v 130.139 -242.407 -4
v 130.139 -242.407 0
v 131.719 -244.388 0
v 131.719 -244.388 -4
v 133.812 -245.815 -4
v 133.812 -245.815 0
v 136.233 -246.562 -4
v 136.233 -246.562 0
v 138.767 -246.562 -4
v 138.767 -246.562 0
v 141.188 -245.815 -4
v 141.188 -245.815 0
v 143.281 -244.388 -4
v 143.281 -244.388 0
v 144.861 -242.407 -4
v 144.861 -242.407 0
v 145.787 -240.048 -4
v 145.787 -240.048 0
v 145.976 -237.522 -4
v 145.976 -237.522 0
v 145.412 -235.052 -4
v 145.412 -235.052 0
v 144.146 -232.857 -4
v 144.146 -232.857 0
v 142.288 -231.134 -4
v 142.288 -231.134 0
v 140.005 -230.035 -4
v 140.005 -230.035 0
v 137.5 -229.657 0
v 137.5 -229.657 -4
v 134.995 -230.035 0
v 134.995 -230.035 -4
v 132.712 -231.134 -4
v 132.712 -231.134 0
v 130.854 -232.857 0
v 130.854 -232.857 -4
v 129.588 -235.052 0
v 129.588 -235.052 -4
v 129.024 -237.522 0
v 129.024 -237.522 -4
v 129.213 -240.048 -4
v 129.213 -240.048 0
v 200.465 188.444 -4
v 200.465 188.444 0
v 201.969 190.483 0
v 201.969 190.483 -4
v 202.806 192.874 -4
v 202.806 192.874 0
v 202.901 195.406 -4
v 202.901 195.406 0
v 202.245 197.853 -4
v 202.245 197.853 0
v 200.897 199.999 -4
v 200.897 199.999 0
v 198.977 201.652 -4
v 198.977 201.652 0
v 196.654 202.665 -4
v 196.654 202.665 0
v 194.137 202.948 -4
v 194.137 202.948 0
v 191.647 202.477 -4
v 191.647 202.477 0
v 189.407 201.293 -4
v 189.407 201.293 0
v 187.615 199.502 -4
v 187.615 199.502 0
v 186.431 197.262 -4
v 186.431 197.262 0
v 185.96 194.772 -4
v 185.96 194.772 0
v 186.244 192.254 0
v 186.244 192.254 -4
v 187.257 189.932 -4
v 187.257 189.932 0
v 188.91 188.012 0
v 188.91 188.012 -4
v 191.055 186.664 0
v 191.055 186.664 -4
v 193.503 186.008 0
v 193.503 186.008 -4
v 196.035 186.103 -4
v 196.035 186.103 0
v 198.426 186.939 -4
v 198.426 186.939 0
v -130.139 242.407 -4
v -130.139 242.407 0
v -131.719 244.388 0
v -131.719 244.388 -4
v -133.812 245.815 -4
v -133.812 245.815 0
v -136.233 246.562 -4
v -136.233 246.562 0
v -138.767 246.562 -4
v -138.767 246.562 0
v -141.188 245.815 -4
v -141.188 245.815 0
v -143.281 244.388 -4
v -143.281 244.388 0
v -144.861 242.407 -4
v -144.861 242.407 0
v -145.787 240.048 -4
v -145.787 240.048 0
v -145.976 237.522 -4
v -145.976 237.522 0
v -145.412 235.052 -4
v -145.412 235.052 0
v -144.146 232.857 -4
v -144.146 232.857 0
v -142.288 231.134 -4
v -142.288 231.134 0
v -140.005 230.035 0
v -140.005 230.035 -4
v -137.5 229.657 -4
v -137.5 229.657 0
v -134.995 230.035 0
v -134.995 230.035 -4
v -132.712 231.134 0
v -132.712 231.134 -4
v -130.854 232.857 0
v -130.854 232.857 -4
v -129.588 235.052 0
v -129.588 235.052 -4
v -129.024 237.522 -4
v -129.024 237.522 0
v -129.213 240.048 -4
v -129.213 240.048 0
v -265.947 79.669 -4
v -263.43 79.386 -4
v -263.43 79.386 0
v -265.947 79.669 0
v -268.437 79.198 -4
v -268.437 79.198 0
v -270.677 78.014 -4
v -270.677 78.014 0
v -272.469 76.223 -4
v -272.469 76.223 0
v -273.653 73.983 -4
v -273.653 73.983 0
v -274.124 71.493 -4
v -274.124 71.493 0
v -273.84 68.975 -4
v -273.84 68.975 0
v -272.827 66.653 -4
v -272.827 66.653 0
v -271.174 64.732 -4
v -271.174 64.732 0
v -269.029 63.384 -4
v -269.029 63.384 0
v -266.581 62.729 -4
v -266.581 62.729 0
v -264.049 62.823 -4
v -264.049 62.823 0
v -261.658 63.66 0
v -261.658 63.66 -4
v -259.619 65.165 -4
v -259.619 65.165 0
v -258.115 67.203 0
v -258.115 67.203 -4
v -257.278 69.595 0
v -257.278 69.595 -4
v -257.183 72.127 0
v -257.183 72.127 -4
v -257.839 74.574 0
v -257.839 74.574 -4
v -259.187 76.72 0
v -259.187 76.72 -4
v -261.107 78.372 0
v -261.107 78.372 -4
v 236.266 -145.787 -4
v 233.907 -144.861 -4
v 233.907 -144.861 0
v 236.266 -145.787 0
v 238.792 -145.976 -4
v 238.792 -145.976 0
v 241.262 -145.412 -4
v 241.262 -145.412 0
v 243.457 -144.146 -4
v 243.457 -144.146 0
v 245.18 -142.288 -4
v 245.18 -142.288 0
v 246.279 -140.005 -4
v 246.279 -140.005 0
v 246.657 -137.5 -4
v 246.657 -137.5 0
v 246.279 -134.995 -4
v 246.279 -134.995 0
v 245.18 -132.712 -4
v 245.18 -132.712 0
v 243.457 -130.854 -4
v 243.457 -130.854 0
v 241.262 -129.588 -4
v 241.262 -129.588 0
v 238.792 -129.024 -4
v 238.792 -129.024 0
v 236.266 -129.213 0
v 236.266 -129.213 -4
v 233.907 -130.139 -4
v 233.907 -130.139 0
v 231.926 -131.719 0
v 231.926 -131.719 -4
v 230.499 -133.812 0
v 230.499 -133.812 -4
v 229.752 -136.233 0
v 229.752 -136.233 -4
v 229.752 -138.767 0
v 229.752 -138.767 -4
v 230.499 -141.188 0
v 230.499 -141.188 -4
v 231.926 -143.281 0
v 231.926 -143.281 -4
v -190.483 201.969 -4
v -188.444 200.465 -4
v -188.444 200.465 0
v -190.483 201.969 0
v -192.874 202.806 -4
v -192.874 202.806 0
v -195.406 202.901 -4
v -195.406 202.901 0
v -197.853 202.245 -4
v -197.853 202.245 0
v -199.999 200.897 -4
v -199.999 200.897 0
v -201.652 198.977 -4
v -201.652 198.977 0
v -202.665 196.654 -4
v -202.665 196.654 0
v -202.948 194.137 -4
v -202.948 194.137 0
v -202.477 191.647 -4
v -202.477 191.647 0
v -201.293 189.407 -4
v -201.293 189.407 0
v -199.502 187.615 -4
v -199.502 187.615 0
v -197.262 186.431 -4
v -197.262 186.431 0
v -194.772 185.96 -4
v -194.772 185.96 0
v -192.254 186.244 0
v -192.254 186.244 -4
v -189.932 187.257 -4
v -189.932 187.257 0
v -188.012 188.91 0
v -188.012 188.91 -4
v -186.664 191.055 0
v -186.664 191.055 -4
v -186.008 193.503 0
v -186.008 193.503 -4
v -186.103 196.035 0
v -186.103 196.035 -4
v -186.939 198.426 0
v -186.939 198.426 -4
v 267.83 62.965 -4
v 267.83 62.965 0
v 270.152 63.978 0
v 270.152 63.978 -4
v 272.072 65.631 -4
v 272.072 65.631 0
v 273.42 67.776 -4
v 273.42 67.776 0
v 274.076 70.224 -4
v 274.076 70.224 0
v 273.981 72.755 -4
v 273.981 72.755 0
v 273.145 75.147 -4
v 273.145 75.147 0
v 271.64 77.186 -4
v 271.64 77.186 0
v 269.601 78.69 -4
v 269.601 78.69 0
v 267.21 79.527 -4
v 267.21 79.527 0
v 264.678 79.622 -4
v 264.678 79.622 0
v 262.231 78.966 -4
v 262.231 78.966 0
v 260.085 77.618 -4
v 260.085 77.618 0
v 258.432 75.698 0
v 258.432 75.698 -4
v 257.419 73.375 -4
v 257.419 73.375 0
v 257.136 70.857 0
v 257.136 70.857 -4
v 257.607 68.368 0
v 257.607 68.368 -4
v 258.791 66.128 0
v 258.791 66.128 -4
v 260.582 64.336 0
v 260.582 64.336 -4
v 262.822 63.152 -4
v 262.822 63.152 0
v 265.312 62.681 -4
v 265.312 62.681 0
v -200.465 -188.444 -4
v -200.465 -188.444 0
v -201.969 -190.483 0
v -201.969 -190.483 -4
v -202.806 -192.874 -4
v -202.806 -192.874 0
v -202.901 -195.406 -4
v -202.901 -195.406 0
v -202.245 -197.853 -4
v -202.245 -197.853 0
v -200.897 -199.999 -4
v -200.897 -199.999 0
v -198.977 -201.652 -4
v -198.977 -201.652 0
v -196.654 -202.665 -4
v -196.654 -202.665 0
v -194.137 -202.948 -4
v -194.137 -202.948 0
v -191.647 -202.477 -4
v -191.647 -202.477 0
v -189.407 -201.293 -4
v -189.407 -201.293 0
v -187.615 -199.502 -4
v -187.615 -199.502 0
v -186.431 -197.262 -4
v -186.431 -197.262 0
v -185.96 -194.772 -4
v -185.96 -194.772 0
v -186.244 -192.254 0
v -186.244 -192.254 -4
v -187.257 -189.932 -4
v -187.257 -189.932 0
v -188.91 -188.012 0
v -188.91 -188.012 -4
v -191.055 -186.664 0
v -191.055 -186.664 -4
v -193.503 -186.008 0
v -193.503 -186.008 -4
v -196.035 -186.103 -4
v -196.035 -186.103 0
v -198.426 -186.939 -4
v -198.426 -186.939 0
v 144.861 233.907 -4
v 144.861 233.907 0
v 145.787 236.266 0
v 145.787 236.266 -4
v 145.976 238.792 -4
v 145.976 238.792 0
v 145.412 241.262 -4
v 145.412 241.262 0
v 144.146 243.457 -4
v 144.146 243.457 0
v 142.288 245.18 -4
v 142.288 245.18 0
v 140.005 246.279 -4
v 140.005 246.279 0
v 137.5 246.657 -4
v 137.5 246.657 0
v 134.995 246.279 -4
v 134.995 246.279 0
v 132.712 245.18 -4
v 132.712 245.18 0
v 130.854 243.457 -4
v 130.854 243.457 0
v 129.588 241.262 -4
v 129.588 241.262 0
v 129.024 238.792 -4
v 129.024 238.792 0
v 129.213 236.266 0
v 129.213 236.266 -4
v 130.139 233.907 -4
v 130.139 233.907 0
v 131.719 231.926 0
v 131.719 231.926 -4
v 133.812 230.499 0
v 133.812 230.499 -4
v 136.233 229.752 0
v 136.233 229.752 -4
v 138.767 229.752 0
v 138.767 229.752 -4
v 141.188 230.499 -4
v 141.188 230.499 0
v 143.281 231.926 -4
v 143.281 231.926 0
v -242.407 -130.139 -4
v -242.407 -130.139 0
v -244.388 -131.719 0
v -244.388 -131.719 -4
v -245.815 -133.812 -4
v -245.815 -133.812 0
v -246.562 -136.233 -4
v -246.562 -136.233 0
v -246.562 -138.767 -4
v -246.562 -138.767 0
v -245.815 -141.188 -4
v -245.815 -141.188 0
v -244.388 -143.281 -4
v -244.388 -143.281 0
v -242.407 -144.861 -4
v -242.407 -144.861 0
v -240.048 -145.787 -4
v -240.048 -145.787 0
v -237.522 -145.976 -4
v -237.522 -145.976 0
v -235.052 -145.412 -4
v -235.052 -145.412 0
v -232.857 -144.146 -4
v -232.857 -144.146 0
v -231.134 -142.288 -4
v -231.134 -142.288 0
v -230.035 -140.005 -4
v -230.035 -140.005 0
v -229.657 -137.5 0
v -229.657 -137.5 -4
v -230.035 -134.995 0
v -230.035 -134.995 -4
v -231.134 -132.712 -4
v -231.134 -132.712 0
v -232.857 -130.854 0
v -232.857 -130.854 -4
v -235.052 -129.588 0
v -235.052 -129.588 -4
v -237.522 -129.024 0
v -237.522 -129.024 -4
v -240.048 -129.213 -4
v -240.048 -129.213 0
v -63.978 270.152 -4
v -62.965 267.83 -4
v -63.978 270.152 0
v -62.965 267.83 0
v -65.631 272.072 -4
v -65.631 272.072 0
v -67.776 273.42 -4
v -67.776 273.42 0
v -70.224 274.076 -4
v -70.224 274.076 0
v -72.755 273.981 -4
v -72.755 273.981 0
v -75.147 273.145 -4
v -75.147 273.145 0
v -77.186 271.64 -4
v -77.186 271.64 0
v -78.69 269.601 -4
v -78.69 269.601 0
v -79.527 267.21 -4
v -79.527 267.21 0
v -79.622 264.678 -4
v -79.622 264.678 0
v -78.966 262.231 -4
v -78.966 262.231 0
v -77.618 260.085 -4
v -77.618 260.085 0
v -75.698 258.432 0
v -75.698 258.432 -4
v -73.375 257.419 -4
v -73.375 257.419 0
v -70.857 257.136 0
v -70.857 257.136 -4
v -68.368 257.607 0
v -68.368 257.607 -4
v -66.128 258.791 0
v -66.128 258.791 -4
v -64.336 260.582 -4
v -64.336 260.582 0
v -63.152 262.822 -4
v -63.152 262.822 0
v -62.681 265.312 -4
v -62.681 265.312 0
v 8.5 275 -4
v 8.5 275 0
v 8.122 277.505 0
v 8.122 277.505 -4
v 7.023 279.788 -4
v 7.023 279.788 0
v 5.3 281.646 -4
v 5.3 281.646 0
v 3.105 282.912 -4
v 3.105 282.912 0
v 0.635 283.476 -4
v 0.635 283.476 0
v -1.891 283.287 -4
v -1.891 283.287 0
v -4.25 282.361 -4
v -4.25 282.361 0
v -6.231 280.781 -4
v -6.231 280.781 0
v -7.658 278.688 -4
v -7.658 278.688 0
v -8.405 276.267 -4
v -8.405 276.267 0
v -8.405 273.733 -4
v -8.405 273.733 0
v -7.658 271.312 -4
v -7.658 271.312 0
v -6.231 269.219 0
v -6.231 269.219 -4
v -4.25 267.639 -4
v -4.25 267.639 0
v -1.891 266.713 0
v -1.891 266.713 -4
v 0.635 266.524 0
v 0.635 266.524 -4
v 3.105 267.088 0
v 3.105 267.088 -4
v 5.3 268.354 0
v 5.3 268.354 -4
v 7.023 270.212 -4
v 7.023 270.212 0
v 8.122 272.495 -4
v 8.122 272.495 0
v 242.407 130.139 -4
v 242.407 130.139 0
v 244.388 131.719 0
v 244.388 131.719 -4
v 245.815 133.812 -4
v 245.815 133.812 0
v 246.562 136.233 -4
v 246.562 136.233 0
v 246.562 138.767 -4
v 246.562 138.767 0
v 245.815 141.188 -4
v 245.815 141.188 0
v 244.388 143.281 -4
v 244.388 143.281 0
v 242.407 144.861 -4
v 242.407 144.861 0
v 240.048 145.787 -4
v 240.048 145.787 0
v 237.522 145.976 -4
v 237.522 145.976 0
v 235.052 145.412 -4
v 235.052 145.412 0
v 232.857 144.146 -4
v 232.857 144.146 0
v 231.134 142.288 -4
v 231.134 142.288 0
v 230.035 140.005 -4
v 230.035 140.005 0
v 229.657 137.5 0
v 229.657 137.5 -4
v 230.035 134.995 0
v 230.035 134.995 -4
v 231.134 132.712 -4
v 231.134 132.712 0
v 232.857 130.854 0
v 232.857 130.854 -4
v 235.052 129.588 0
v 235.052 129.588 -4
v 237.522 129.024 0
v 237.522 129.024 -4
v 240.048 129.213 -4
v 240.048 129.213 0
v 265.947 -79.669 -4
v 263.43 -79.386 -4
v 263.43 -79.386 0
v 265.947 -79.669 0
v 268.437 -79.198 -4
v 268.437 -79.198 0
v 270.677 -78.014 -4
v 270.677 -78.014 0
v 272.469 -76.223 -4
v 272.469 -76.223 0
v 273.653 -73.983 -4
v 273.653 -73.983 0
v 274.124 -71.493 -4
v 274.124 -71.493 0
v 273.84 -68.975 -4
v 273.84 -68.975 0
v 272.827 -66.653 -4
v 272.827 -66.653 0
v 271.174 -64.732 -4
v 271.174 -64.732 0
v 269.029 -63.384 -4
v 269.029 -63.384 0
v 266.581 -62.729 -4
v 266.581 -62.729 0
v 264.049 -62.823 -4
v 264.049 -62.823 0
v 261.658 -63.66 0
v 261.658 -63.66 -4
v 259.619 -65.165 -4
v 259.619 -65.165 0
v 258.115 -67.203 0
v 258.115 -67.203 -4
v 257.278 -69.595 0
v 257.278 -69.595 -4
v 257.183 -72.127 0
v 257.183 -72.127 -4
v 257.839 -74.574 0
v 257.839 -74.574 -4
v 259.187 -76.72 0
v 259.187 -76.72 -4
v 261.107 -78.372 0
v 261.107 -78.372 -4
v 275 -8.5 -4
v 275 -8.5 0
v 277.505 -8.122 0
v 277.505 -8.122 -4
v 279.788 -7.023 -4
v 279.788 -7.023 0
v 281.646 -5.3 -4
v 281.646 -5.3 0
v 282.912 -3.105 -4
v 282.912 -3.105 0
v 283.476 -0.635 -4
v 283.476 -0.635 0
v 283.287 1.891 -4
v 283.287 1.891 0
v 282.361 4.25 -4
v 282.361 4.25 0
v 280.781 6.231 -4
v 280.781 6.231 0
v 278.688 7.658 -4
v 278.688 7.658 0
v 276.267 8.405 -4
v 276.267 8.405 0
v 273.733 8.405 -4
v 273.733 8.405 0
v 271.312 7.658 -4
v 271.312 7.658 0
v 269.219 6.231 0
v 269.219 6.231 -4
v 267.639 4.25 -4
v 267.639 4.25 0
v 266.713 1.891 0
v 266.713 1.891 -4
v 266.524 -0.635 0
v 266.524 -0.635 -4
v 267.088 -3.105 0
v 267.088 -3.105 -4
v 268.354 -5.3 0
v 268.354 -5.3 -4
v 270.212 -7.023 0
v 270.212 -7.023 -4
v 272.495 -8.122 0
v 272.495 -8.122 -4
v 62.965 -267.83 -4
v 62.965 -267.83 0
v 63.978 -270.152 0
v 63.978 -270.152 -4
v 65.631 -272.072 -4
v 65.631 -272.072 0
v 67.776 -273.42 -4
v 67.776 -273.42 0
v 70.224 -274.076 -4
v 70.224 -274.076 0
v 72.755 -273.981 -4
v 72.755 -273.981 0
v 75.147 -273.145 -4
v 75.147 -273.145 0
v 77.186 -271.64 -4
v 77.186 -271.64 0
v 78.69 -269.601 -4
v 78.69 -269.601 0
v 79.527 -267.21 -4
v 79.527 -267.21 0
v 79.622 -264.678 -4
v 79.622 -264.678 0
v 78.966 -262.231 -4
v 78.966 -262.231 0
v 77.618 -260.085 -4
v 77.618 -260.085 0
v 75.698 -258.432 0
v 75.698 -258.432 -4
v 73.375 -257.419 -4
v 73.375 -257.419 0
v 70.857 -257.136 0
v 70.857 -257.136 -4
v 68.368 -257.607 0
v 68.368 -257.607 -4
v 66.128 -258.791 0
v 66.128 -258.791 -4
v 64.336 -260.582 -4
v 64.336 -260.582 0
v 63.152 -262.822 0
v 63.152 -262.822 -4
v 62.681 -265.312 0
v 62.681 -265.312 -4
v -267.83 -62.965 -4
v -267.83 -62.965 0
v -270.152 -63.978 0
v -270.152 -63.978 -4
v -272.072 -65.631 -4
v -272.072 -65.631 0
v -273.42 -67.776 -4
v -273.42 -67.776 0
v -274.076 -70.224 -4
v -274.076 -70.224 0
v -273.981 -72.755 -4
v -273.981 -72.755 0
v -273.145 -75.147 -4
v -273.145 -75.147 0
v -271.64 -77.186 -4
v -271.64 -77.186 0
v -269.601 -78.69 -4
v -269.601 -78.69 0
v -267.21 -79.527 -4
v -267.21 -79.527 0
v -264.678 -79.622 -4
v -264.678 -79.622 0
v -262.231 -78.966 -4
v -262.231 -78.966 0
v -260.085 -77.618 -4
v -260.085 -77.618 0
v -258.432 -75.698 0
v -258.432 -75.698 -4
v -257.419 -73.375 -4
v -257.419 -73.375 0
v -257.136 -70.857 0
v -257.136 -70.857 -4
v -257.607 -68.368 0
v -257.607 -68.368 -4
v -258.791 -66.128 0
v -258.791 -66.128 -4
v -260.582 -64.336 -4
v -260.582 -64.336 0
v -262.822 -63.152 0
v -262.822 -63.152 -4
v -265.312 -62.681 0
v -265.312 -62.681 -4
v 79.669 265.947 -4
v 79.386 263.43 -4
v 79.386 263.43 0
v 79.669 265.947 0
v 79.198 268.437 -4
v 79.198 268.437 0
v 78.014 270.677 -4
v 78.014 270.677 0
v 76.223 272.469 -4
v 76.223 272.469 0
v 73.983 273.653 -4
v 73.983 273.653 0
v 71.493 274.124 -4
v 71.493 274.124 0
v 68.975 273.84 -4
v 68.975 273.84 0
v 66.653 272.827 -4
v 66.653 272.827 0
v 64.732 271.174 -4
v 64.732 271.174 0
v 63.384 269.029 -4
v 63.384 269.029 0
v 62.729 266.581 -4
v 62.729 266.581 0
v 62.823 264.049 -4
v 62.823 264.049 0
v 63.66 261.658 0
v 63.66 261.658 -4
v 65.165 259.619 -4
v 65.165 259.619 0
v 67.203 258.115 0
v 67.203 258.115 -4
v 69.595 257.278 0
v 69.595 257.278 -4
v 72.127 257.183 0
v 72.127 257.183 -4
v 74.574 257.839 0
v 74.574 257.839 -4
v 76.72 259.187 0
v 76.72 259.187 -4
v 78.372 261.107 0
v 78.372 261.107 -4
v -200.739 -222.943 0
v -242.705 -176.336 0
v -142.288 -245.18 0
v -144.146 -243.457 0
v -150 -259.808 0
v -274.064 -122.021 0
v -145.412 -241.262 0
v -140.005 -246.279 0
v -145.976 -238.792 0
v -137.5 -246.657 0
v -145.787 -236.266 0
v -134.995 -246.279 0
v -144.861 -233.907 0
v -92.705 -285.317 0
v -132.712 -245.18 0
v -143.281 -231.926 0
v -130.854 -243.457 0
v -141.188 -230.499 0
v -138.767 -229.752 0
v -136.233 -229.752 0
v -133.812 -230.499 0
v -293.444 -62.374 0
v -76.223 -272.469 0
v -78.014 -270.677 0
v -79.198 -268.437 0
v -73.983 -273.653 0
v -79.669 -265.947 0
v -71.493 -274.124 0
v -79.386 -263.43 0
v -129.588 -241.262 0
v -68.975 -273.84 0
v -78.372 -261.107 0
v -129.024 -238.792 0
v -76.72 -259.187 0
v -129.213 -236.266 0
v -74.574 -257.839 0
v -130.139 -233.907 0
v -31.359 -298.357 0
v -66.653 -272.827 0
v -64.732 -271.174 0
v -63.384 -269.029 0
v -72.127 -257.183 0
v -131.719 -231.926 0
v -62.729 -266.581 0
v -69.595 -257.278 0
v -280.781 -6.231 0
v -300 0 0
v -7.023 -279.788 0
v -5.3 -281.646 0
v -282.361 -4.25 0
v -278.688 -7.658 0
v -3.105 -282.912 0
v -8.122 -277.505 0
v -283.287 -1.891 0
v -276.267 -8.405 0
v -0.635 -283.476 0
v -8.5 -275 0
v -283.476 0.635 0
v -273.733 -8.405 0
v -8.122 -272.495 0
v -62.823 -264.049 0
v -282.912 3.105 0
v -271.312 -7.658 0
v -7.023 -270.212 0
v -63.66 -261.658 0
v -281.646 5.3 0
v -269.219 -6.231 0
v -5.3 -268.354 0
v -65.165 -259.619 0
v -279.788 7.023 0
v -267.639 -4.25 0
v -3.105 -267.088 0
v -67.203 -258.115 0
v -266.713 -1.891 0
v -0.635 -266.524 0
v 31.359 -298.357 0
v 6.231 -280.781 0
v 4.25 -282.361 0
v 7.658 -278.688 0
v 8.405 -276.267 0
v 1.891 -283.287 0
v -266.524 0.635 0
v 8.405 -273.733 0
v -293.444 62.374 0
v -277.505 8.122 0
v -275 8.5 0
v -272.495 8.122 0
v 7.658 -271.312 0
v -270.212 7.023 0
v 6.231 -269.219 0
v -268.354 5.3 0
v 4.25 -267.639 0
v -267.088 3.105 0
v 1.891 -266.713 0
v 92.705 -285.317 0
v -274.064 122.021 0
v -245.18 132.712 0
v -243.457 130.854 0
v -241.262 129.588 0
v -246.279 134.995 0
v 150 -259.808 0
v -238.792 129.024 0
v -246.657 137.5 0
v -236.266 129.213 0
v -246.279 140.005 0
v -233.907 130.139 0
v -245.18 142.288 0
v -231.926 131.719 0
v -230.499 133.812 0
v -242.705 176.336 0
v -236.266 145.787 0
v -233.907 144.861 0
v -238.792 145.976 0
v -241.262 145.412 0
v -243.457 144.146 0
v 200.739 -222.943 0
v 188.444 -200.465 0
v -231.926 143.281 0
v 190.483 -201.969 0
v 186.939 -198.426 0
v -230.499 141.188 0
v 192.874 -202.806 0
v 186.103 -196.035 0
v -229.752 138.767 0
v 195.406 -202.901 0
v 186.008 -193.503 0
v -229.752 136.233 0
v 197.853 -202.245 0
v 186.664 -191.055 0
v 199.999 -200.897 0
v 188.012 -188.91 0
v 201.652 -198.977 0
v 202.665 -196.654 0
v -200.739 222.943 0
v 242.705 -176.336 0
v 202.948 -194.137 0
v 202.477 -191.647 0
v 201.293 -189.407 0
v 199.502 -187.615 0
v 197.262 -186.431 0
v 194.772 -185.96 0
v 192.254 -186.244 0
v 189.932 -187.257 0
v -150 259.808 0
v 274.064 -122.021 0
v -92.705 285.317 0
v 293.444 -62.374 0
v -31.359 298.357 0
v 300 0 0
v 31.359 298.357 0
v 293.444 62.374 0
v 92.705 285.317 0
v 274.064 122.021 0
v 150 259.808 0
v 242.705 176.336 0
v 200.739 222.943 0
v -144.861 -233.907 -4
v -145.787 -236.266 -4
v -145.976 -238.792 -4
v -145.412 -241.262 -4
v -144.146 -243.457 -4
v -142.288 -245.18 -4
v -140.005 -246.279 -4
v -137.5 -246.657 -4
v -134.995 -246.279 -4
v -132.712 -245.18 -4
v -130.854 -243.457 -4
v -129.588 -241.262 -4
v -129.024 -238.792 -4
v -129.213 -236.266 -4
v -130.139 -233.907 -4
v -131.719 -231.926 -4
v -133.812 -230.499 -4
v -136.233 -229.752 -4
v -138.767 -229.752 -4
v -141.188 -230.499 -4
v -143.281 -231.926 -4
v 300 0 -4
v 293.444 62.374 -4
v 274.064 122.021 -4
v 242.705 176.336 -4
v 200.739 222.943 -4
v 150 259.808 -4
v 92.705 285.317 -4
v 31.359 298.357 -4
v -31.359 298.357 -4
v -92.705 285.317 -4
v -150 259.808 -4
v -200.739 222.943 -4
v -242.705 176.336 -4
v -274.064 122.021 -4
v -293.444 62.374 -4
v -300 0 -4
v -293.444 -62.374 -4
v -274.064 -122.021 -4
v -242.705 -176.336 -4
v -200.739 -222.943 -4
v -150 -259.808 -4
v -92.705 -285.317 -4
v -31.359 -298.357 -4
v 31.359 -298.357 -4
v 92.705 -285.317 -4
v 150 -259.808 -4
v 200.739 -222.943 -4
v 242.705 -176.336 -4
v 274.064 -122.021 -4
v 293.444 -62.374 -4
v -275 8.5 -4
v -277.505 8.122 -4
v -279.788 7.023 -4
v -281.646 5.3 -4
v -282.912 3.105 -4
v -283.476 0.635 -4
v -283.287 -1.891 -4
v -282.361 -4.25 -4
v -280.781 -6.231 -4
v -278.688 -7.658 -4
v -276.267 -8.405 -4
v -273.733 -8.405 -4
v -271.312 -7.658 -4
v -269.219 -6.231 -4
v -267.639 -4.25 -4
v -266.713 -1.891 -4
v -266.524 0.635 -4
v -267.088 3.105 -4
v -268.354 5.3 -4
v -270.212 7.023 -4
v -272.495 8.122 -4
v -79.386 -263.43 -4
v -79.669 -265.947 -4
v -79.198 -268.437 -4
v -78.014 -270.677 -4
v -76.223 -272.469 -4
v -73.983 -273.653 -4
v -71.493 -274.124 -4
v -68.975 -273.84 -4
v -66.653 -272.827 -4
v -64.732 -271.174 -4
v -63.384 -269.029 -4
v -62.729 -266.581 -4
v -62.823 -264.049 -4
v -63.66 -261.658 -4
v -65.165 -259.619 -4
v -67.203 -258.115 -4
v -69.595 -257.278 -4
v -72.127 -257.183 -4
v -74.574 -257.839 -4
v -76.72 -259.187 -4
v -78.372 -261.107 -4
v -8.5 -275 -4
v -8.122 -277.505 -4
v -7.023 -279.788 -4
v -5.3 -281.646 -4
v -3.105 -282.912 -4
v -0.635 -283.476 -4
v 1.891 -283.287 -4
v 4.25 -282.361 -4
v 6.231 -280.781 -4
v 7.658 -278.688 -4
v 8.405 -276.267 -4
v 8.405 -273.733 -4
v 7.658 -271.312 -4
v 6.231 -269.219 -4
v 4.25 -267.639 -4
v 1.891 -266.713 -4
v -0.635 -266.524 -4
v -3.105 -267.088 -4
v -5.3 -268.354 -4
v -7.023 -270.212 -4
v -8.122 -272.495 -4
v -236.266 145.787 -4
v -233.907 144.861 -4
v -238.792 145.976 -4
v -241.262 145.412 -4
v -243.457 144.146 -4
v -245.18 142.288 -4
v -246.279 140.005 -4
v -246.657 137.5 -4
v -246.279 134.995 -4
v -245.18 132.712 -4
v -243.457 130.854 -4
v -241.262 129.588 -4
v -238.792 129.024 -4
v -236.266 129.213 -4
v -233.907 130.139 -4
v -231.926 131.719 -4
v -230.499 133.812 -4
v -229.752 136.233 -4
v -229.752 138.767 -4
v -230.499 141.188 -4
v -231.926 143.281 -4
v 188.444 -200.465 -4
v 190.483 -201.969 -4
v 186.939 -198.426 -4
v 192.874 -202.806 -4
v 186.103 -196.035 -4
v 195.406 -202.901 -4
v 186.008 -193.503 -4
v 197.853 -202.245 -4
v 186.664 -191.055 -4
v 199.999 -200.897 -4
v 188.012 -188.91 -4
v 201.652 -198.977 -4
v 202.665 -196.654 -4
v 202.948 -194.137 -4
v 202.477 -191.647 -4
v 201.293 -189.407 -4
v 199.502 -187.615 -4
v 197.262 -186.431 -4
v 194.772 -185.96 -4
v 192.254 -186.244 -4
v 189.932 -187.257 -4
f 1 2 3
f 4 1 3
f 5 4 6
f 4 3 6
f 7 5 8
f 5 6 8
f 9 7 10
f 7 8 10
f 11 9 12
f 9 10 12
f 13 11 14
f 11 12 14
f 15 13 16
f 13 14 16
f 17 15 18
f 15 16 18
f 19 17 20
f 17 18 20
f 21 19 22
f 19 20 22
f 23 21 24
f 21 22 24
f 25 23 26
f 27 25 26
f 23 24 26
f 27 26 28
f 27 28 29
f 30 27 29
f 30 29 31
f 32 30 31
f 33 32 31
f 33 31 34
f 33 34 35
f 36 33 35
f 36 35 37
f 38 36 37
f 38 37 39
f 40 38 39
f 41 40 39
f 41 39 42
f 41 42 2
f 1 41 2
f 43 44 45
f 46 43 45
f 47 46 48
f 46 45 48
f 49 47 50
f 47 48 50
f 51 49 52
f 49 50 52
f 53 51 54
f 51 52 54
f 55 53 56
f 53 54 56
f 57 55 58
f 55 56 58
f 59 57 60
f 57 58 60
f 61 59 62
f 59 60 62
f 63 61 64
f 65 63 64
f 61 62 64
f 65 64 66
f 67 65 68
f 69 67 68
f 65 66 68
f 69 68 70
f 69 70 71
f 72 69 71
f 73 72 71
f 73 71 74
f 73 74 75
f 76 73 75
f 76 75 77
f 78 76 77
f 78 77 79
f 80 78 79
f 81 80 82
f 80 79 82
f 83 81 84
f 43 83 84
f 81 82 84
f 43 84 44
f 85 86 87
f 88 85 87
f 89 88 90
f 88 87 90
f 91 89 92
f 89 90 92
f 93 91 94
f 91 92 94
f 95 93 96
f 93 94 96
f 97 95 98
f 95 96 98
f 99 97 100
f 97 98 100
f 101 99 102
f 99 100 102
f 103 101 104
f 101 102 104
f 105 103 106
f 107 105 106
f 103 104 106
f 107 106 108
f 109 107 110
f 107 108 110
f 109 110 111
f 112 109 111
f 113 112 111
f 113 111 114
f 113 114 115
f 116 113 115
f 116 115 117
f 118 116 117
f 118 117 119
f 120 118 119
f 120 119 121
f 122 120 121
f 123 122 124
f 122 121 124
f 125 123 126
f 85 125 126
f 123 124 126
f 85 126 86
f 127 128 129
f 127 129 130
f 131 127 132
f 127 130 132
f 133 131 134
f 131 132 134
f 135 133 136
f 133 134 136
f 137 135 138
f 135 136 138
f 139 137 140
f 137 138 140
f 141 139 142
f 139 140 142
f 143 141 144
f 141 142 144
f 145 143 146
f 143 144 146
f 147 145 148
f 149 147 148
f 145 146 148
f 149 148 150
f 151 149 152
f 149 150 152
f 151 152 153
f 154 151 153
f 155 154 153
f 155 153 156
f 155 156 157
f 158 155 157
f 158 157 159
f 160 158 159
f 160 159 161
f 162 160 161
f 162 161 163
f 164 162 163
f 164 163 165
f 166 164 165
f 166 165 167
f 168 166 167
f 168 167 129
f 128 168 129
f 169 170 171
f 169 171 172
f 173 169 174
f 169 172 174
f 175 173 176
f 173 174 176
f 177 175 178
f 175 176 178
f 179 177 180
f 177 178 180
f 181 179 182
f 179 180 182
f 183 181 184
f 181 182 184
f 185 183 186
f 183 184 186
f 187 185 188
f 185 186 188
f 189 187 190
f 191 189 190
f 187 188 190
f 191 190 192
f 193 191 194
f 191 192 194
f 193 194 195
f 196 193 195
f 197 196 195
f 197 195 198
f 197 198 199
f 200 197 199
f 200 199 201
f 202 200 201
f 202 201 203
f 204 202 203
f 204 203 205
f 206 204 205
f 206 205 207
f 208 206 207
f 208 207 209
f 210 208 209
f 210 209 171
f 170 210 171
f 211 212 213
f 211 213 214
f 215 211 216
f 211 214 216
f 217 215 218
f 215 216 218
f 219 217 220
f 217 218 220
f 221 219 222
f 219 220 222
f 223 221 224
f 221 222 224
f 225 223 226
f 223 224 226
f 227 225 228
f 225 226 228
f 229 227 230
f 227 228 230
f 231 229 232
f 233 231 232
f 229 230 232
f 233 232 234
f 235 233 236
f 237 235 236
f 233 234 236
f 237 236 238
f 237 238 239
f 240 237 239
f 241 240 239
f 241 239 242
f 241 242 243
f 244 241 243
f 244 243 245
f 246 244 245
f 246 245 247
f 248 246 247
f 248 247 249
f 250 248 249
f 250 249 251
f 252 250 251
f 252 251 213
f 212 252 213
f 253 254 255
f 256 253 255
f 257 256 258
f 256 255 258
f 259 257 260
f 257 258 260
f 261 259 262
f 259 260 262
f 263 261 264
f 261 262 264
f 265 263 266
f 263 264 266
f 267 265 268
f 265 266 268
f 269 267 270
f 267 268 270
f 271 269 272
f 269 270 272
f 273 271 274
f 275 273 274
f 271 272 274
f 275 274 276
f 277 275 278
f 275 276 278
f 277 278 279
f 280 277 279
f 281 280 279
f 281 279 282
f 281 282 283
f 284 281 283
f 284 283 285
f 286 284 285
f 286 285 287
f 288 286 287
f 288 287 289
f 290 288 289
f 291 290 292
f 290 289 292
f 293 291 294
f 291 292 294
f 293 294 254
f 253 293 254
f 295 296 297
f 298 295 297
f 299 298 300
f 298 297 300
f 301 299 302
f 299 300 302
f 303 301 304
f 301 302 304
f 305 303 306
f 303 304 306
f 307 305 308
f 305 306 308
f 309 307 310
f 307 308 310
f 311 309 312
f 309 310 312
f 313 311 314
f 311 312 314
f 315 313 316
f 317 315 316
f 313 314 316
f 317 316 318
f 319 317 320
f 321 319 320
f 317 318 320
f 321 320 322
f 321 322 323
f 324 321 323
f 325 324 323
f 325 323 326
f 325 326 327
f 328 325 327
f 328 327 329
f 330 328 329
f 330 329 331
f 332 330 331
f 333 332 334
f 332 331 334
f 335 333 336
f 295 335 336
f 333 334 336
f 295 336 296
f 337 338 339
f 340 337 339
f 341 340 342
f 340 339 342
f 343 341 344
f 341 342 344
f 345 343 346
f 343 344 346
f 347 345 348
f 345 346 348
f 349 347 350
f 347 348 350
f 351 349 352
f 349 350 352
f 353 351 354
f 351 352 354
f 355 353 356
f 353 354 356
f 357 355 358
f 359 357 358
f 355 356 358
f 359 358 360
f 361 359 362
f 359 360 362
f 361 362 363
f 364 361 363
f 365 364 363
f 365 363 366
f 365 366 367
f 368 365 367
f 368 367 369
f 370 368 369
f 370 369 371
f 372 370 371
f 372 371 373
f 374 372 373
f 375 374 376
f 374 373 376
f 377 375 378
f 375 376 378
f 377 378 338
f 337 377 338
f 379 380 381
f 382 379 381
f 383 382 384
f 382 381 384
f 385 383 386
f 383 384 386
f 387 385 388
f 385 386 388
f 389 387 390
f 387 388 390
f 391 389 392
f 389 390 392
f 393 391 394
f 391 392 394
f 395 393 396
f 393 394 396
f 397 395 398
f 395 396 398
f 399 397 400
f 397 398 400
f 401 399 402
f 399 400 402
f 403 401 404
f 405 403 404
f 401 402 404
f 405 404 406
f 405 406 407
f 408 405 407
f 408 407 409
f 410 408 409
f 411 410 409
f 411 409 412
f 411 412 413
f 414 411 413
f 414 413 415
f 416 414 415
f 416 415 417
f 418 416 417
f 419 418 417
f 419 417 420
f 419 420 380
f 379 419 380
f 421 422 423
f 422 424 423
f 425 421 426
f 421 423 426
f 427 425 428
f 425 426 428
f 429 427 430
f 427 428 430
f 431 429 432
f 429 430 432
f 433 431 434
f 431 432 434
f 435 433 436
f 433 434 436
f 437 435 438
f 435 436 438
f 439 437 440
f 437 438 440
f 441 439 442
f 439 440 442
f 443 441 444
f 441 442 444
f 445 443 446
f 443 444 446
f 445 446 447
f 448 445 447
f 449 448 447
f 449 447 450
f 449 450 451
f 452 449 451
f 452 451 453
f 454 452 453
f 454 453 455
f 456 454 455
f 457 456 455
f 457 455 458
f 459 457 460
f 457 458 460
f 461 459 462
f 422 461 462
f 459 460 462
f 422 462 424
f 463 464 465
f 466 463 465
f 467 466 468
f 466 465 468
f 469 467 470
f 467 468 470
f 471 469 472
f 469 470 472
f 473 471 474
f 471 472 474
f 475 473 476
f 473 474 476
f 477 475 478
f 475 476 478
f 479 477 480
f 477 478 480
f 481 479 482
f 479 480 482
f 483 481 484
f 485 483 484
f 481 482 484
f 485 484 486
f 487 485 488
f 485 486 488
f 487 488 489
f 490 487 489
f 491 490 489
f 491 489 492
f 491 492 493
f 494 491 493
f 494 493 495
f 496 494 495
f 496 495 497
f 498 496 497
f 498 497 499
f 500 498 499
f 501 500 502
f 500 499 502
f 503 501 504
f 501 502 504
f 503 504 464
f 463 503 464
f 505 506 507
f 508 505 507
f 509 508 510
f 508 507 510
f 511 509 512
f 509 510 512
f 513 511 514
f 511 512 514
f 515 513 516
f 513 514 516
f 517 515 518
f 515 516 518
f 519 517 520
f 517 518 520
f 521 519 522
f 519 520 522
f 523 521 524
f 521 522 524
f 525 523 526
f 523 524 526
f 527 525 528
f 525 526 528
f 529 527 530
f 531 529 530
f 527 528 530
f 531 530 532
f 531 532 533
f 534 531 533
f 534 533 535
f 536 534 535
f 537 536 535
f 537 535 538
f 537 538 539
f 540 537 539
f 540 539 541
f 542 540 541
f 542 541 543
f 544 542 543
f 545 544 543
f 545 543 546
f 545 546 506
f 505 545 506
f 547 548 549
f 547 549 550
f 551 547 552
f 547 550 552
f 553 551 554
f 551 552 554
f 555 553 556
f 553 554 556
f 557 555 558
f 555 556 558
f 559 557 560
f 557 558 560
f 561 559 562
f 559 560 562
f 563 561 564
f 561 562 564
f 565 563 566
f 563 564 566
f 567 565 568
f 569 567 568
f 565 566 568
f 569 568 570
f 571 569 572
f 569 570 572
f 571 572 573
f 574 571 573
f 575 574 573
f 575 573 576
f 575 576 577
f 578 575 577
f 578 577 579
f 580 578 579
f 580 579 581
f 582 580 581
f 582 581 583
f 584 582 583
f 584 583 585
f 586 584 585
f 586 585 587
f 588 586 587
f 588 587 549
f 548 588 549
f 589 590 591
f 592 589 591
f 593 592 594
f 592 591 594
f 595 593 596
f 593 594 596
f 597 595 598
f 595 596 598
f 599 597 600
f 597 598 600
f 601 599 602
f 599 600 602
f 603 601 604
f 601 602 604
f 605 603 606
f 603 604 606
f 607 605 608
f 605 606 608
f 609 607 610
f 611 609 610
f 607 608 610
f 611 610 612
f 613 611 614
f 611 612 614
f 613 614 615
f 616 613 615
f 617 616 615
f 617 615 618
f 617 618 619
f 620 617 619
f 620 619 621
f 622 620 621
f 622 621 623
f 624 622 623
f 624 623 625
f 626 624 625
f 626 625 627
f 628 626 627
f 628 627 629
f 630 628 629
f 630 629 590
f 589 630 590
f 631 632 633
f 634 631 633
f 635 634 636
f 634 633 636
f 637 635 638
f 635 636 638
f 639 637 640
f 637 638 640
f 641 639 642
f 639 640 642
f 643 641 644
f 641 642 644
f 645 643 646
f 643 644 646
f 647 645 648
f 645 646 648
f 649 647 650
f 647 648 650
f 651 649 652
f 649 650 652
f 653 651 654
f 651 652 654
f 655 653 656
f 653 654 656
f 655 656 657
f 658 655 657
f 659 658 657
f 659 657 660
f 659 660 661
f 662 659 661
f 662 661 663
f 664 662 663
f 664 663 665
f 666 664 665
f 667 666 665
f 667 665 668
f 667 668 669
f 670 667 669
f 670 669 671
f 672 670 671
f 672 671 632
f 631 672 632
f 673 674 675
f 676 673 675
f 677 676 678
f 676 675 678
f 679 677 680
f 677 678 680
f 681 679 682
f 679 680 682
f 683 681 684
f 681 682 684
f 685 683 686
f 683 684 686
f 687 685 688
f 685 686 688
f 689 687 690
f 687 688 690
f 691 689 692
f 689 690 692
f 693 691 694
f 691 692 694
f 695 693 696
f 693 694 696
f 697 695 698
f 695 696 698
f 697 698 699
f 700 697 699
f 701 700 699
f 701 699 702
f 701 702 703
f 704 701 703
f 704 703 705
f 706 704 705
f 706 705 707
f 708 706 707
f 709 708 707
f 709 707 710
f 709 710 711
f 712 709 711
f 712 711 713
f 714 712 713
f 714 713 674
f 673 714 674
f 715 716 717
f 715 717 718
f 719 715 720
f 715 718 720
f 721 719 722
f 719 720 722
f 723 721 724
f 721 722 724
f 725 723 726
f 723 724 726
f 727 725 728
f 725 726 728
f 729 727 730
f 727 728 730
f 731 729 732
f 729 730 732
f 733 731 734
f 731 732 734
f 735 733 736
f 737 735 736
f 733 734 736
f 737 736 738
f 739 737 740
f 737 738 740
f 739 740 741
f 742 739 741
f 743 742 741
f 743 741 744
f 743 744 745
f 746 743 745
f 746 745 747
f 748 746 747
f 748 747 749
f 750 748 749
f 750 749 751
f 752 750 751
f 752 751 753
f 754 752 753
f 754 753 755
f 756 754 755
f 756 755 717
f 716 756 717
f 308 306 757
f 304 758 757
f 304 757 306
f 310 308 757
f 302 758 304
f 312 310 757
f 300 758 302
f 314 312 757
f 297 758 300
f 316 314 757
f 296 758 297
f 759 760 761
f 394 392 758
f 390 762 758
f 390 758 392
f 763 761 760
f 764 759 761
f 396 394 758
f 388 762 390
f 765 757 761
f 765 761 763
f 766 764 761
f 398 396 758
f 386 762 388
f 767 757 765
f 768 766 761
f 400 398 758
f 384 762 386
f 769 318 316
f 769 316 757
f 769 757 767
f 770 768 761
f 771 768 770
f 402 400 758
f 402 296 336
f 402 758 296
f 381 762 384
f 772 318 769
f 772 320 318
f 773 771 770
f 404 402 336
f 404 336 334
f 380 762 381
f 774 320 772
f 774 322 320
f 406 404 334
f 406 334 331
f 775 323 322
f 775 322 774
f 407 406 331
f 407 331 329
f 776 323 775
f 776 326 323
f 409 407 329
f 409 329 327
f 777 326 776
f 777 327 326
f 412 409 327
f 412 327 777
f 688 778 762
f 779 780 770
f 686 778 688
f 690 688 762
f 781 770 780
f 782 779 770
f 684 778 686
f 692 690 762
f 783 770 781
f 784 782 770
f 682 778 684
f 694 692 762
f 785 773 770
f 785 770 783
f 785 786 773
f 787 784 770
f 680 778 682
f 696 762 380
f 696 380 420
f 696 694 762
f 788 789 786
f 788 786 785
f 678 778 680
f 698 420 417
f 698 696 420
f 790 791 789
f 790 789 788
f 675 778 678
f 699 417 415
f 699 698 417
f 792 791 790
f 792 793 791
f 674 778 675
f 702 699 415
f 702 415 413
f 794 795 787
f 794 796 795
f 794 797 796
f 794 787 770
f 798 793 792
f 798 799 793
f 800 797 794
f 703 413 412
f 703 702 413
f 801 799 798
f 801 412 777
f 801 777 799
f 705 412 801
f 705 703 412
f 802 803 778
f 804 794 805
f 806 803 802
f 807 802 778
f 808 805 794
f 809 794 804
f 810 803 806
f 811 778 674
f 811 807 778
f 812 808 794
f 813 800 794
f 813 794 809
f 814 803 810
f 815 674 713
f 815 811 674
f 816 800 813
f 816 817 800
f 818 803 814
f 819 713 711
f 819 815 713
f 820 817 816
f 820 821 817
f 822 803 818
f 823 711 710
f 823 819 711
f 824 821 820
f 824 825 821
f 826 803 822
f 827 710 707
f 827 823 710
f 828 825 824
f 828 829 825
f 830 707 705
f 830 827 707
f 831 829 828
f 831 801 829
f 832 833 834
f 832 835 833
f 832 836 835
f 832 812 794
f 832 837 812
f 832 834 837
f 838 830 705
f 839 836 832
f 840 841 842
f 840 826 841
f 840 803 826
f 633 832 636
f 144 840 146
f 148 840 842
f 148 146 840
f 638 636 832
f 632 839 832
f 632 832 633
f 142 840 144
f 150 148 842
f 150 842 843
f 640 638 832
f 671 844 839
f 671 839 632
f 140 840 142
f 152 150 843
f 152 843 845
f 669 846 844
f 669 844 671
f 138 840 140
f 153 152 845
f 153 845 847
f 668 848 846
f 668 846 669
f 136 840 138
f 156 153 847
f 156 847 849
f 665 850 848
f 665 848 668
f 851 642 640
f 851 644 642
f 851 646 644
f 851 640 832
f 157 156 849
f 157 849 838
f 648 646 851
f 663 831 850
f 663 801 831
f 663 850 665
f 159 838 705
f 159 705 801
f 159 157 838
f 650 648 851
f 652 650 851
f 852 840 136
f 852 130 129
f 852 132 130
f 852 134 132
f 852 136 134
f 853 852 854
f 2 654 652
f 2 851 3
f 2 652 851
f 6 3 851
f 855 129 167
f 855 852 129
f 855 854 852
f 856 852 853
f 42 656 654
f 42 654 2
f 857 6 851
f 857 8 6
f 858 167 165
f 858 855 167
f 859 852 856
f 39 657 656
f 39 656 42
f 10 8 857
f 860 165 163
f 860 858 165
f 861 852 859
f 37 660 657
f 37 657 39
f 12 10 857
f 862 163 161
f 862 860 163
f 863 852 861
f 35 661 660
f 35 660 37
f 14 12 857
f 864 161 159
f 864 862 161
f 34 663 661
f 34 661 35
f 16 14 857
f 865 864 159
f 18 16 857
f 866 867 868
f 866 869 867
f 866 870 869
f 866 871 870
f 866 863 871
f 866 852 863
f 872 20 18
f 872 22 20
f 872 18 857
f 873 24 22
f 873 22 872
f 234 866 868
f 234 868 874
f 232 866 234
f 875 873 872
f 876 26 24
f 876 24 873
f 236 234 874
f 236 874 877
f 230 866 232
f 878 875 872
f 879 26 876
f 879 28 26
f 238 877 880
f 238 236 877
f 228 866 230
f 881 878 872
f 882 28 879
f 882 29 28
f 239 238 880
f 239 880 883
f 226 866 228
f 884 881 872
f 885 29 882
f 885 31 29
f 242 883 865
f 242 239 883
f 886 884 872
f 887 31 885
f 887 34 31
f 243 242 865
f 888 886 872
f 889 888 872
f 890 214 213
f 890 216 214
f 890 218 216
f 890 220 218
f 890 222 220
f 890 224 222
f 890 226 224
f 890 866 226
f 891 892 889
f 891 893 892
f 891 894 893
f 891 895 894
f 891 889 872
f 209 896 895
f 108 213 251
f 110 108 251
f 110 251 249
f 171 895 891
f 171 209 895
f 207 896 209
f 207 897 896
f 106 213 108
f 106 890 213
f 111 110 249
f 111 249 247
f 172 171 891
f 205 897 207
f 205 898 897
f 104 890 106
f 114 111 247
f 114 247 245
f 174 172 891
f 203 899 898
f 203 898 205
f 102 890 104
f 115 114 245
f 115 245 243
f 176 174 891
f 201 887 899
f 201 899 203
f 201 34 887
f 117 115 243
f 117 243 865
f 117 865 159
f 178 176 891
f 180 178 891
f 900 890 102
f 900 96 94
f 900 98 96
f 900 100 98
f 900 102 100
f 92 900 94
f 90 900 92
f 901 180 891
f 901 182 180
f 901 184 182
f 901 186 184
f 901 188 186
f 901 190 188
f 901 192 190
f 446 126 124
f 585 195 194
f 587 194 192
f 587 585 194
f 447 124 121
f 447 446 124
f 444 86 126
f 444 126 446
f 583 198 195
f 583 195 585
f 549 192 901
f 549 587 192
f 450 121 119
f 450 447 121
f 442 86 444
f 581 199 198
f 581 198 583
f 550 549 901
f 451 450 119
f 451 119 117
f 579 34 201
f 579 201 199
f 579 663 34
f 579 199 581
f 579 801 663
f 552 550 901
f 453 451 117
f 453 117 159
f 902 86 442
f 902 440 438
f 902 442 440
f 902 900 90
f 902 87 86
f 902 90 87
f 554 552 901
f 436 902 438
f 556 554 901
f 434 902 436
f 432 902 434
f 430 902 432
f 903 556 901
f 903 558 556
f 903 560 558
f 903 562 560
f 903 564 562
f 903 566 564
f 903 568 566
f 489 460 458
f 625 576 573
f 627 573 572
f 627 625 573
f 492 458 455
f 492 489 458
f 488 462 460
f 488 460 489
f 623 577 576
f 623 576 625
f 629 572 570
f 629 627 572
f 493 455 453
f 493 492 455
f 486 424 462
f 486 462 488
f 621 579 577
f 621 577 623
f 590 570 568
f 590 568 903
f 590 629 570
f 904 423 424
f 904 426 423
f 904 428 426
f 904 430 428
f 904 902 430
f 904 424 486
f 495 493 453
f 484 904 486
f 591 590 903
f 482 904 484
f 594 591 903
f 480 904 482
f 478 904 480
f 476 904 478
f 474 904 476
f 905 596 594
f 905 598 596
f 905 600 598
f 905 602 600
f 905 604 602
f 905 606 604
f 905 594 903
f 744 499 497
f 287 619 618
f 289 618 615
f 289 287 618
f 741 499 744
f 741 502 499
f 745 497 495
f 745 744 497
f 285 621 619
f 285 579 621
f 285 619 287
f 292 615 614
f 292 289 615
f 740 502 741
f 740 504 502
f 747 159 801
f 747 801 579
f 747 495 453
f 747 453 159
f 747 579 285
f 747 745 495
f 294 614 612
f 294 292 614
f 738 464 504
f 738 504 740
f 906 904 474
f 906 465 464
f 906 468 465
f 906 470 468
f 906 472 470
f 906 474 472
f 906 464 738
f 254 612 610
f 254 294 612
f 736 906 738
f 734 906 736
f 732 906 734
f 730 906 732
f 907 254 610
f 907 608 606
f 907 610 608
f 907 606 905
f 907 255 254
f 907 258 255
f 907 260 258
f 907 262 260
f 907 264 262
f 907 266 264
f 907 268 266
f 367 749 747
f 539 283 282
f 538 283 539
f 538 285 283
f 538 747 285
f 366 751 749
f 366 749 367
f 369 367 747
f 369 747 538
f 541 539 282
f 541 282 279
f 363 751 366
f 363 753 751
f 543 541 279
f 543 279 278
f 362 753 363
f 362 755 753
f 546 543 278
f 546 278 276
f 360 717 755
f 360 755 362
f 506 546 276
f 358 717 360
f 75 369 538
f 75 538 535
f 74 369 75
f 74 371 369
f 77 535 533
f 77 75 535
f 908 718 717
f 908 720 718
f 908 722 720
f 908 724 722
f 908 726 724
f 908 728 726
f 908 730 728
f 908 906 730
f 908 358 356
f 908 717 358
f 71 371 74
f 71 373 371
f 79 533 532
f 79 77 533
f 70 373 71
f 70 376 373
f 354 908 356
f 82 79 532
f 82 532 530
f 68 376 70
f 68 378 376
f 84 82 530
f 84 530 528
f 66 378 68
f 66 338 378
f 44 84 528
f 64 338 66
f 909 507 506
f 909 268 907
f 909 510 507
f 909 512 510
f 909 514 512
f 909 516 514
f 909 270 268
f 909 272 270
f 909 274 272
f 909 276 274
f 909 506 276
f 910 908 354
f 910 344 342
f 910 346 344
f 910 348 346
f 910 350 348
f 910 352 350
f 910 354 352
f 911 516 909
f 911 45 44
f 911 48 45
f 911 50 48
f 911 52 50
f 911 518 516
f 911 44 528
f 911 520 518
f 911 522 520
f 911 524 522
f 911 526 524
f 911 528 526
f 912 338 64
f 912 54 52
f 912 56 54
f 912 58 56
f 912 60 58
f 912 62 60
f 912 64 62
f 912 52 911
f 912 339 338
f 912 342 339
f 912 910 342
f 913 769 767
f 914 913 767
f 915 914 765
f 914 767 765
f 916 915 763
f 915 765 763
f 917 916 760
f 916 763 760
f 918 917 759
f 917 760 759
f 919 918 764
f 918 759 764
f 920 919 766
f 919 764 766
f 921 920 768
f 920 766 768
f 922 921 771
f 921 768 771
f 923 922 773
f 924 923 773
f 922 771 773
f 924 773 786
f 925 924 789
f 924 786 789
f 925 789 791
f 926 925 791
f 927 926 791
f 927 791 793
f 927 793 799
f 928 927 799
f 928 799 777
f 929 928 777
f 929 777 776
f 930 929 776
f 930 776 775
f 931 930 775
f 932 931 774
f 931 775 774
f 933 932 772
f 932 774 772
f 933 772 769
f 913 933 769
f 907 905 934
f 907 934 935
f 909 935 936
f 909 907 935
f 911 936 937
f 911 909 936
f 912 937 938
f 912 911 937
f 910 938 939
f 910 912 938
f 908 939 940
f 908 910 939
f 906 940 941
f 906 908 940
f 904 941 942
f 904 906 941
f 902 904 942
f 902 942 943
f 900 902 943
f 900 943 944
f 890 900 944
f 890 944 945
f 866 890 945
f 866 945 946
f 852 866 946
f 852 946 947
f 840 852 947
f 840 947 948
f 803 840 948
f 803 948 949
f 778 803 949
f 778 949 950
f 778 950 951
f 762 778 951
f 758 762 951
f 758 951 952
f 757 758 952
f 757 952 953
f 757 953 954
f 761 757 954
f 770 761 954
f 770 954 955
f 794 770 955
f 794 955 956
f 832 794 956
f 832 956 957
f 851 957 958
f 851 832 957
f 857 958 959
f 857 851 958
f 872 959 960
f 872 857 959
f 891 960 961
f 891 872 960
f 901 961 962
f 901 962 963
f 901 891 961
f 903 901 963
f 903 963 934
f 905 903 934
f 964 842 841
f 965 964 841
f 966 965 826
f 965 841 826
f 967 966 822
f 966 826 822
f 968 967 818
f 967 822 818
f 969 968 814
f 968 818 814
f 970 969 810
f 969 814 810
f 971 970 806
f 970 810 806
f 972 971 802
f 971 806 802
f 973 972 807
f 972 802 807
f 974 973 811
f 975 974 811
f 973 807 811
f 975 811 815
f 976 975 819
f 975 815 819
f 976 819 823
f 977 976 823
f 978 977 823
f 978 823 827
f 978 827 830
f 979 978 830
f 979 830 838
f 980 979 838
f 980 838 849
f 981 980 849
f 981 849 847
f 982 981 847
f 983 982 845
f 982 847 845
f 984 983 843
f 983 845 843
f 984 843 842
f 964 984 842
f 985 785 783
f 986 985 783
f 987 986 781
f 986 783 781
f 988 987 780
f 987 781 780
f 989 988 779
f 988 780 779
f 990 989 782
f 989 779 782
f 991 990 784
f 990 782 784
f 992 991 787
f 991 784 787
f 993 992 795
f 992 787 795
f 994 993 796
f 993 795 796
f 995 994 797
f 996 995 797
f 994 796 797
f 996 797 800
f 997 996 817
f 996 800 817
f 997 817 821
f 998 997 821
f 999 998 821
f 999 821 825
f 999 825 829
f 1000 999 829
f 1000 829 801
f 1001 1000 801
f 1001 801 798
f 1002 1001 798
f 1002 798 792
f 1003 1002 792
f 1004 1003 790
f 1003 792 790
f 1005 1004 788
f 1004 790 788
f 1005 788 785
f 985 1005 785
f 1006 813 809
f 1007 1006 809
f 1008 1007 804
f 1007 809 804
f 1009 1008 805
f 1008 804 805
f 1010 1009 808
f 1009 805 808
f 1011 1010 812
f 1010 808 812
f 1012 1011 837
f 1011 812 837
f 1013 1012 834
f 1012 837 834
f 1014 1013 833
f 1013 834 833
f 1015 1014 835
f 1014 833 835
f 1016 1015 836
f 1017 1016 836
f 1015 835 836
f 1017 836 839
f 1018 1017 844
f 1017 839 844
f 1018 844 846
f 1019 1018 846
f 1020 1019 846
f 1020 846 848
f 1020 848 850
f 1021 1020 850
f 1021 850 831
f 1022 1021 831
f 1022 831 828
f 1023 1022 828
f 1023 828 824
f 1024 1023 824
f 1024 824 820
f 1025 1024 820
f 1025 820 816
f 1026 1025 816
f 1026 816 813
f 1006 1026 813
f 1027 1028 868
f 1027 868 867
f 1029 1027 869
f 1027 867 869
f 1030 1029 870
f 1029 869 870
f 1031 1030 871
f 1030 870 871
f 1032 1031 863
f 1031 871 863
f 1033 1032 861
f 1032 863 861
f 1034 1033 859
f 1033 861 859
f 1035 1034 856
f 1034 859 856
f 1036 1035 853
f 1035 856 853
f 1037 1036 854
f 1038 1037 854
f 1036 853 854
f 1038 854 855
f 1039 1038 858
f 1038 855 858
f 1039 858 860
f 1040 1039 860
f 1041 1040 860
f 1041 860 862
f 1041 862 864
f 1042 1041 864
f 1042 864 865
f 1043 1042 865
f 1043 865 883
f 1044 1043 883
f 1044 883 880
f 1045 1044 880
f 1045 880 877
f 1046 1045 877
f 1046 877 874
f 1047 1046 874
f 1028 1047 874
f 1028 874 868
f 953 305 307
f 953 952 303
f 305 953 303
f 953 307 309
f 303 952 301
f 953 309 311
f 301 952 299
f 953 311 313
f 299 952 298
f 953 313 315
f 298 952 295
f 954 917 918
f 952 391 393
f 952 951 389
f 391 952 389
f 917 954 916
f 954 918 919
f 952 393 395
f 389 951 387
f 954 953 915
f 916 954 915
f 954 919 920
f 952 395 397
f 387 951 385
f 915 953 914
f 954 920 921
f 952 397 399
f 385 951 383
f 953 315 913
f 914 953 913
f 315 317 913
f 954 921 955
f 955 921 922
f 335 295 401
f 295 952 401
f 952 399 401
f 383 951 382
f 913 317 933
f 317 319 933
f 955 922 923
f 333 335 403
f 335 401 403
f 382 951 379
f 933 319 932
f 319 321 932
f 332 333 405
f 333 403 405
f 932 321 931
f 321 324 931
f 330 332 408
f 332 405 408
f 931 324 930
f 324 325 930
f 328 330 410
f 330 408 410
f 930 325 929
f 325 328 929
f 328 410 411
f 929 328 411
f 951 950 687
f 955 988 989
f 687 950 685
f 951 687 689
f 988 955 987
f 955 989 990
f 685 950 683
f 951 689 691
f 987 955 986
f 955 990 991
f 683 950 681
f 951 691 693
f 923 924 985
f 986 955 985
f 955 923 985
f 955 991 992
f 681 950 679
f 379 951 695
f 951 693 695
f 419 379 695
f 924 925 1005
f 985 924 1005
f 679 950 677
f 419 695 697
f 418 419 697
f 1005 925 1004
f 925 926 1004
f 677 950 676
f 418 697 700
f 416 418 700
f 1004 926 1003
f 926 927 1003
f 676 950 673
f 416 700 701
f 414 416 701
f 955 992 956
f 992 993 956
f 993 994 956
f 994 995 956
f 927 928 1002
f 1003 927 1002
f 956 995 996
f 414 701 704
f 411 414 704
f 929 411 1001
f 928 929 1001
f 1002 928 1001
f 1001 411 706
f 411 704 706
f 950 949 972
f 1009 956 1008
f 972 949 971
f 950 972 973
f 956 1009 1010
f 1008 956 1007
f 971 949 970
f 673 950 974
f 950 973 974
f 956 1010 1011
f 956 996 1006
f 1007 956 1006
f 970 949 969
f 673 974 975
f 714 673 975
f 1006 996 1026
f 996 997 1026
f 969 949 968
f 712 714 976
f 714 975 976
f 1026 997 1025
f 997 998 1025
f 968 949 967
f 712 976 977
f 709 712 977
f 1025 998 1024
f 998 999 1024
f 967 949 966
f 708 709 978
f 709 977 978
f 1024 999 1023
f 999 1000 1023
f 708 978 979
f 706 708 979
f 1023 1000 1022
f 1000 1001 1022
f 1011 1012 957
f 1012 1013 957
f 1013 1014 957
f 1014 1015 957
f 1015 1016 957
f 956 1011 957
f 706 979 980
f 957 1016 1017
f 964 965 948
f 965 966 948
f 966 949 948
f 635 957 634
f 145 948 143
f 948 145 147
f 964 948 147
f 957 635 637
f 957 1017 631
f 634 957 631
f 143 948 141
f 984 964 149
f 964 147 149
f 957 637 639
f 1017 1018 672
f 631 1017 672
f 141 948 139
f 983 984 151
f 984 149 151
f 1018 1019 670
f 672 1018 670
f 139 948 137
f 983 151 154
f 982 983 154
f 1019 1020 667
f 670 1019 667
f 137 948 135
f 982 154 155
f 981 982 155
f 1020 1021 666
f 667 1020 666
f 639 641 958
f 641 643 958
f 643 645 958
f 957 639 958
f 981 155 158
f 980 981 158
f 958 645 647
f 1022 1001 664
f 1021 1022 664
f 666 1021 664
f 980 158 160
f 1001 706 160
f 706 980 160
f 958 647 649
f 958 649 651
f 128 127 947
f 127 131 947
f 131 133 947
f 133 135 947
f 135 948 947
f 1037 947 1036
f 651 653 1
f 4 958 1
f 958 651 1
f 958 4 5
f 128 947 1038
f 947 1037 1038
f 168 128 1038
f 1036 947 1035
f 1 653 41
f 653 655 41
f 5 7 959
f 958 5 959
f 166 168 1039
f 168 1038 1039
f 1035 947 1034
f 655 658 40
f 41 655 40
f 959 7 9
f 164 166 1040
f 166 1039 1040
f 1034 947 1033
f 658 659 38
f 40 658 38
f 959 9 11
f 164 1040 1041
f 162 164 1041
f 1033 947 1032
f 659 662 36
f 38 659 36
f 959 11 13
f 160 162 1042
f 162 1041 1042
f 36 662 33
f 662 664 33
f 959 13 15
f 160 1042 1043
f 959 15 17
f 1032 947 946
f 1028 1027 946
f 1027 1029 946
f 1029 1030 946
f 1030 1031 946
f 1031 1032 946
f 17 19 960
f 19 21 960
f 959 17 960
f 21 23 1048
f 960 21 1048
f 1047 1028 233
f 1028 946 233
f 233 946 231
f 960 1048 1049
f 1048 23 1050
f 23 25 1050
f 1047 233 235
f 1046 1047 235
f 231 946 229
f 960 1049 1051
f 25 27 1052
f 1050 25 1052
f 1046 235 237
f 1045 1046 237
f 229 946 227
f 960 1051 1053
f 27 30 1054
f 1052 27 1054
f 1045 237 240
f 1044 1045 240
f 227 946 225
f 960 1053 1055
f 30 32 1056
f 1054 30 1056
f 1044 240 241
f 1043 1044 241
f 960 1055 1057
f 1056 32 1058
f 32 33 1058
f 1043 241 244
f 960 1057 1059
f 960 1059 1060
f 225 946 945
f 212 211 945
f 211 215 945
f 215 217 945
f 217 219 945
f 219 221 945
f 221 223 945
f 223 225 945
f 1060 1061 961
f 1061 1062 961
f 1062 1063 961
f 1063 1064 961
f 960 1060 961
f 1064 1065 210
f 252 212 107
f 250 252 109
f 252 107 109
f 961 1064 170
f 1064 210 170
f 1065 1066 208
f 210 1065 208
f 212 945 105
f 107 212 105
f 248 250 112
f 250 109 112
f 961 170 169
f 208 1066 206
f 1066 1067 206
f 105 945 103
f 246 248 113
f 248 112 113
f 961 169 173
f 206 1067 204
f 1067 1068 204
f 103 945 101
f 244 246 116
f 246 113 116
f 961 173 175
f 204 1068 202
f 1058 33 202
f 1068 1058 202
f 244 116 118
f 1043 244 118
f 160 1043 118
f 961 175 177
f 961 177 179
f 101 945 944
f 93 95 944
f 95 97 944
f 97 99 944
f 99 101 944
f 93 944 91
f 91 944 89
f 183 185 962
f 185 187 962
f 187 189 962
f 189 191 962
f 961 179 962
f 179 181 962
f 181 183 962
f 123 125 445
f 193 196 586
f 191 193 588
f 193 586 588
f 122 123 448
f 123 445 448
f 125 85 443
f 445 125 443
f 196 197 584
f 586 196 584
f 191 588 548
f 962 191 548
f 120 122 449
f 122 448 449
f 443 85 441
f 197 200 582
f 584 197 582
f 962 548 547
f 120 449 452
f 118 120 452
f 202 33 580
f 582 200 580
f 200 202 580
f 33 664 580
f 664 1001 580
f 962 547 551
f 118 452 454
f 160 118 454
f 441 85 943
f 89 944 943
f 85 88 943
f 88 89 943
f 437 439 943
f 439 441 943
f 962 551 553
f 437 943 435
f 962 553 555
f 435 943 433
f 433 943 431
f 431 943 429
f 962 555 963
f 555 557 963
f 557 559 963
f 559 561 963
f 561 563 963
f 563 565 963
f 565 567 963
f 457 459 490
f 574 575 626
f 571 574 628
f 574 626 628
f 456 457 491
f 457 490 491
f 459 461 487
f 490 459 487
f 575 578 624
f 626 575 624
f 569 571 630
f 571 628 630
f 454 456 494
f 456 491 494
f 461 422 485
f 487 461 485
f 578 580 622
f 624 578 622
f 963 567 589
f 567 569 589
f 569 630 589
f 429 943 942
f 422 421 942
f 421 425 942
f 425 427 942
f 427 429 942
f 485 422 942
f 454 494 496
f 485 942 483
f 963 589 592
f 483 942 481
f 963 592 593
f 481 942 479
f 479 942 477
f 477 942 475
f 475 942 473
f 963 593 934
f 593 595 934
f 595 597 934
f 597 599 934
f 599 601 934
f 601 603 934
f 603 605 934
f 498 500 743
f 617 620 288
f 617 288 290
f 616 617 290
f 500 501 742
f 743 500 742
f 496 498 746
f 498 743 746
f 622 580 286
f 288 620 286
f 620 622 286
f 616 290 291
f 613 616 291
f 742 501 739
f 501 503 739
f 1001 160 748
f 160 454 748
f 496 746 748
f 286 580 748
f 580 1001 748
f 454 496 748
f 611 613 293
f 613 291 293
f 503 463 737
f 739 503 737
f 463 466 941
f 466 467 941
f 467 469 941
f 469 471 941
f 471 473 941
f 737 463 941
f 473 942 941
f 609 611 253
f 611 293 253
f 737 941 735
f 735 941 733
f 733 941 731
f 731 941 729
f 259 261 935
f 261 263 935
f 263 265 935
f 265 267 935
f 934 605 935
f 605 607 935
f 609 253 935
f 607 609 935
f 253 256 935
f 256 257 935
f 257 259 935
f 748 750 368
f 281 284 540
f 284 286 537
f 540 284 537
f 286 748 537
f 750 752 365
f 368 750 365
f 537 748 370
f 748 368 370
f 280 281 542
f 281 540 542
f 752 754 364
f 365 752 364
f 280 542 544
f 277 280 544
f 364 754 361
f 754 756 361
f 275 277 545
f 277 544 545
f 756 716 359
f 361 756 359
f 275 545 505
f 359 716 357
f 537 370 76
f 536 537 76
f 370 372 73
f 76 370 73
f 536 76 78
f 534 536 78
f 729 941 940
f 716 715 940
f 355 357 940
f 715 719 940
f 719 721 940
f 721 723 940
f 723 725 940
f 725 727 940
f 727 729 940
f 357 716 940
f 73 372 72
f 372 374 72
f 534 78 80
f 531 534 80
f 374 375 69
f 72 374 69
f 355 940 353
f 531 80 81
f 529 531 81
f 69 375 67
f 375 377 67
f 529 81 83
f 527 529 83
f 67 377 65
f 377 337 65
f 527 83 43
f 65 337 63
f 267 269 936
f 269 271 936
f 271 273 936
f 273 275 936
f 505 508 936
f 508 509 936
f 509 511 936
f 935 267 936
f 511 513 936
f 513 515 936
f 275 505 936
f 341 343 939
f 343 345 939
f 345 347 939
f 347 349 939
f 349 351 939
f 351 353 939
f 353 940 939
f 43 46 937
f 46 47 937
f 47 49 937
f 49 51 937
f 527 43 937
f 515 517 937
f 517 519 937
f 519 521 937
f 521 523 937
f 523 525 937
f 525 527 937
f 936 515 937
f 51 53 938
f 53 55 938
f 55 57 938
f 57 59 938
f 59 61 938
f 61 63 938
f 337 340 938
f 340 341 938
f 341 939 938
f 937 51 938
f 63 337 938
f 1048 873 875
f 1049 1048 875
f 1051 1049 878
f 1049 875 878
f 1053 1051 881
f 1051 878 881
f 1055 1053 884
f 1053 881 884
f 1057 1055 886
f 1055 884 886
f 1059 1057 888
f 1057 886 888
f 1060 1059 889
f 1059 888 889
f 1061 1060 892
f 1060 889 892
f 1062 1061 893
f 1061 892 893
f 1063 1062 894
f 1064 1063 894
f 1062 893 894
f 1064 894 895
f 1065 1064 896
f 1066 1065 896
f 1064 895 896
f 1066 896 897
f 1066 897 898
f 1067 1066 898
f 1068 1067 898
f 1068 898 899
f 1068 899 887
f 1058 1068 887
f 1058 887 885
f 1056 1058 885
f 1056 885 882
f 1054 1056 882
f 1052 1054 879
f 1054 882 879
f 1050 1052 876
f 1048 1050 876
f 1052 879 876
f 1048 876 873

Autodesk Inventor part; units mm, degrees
ref_plane "YZ Plane" through (0, 0, 0) normal (1, 0, 0) x (0, 1, 0)
ref_plane "XZ Plane" through (0, 0, 0) normal (0, 1, 0) x (-1, 0, 0)
ref_plane "XY Plane" through (0, 0, 0) normal (0, 0, 1) x (1, 0, 0)
sketch "Sketch1" plane through (0, 0, 0) normal (0, 0, 1) x (1, 0, 0)
  circle A0 centre (0, 0) radius 300
  dimension "d0" = 600
extrude "Plate1" add sketch "Sketch1" against normal blind 4
sketch "Sketch2" plane through (0, 0, 0) normal (0, 0, 1) x (1, 0, 0)
  circle A0 centre (0, 0) radius 275 construction
  circle A1 centre (0, 275) radius 8.5
  dimension "d2" = 550
  dimension "d3" = 17
extrude "Extrusion1" cut sketch "Sketch2" against normal through all
pattern_circular "Circular Pattern1" count 24 over 360 about axis through (0, 0, -10) along (0, 0, 1) of "Extrusion1"
equation "\"d1\" = Thickness"
equation "\"BendReliefWidth\" = Thickness"
equation "\"BendReliefDepth\" = 0.5 * Thickness"
equation "\"CornerReliefSize\" = 4 * Thickness"
equation "\"MinimumRemnant\" = 2 * Thickness"
equation "\"TransitionRadius\" = BendRadius"
equation "\"JacobiRadiusSize\" = BendRadius"
equation "\"GapSize\" = Thickness"
equation "\"Thickness\" = 4"
equation "\"BendRadius\" = 6"
properties part number "MSC 404 flange cover 500" material "Stainless Steel"
